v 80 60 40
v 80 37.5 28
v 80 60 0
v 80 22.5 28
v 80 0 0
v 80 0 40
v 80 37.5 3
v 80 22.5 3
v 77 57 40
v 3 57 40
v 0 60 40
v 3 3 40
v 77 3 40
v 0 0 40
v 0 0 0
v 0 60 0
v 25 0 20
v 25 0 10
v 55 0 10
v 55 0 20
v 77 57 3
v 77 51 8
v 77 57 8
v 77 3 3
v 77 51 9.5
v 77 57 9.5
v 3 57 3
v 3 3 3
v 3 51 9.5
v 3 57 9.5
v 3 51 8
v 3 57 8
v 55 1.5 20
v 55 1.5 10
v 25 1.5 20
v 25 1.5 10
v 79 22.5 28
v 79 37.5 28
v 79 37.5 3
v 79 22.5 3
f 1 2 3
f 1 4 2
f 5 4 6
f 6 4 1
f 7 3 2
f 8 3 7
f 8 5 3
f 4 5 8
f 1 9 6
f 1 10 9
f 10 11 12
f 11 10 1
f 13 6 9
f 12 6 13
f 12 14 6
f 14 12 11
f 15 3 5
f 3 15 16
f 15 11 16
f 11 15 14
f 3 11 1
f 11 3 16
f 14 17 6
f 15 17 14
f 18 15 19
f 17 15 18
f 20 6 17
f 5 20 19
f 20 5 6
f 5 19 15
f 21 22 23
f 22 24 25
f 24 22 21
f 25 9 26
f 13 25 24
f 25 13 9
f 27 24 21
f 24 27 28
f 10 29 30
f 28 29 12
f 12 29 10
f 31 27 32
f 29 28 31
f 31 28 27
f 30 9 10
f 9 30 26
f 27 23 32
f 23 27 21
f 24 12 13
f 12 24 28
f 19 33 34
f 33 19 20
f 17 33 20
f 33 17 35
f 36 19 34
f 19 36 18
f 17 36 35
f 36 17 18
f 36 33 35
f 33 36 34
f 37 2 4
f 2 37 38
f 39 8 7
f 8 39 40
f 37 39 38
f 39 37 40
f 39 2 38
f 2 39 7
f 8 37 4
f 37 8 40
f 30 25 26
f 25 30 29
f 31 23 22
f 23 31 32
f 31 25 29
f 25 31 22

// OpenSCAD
// Enclosure outer dimensions
outer_length = 80;
outer_width = 60;
outer_height = 40;

// Wall and bottom thickness
wall_thickness = 3;
bottom_thickness = 3;

// Front face: centered horizontal recess above lower edge
front_recess_width = 30;
front_recess_height = 10;
front_recess_depth = 1.5;
front_recess_z_offset = 10;

// Right face: taller vertical through-opening from underside region
right_opening_width = 15;
right_opening_height = 25;
right_opening_z_offset = bottom_thickness;

// Interior ledge along back wall
ledge_depth = 6;
ledge_thickness = 1.5;
ledge_z = bottom_thickness + 5;

$fn = 100;

// Main enclosure body with subtractions
difference() {
    // Solid outer block
    cube([outer_length, outer_width, outer_height]);

    // Hollow interior — open top, leaves wall rim
    translate([wall_thickness, wall_thickness, bottom_thickness])
        cube([
            outer_length - 2 * wall_thickness,
            outer_width - 2 * wall_thickness,
            outer_height - bottom_thickness + 1
        ]);

    // Front recess: centered horizontally, above lower edge
    // Subtracted material on the Y-minus face
    translate([
        (outer_length - front_recess_width) / 2,
        -1,
        front_recess_z_offset
    ])
        cube([front_recess_width, front_recess_depth + 1, front_recess_height]);

    // Right through-opening: taller vertical cut from underside region
    // Subtracted material on the X-plus face
    translate([
        outer_length - 1,
        (outer_width - right_opening_width) / 2,
        right_opening_z_offset
    ])
        cube([wall_thickness + 2, right_opening_width, right_opening_height]);
}

// Interior ledge: thin shelf rib along back wall
// Creates a shallow stepped tier inside the enclosure
translate([
    wall_thickness,
    outer_width - wall_thickness - ledge_depth,
    ledge_z
])
    cube([
        outer_length - 2 * wall_thickness,
        ledge_depth,
        ledge_thickness
    ]);
